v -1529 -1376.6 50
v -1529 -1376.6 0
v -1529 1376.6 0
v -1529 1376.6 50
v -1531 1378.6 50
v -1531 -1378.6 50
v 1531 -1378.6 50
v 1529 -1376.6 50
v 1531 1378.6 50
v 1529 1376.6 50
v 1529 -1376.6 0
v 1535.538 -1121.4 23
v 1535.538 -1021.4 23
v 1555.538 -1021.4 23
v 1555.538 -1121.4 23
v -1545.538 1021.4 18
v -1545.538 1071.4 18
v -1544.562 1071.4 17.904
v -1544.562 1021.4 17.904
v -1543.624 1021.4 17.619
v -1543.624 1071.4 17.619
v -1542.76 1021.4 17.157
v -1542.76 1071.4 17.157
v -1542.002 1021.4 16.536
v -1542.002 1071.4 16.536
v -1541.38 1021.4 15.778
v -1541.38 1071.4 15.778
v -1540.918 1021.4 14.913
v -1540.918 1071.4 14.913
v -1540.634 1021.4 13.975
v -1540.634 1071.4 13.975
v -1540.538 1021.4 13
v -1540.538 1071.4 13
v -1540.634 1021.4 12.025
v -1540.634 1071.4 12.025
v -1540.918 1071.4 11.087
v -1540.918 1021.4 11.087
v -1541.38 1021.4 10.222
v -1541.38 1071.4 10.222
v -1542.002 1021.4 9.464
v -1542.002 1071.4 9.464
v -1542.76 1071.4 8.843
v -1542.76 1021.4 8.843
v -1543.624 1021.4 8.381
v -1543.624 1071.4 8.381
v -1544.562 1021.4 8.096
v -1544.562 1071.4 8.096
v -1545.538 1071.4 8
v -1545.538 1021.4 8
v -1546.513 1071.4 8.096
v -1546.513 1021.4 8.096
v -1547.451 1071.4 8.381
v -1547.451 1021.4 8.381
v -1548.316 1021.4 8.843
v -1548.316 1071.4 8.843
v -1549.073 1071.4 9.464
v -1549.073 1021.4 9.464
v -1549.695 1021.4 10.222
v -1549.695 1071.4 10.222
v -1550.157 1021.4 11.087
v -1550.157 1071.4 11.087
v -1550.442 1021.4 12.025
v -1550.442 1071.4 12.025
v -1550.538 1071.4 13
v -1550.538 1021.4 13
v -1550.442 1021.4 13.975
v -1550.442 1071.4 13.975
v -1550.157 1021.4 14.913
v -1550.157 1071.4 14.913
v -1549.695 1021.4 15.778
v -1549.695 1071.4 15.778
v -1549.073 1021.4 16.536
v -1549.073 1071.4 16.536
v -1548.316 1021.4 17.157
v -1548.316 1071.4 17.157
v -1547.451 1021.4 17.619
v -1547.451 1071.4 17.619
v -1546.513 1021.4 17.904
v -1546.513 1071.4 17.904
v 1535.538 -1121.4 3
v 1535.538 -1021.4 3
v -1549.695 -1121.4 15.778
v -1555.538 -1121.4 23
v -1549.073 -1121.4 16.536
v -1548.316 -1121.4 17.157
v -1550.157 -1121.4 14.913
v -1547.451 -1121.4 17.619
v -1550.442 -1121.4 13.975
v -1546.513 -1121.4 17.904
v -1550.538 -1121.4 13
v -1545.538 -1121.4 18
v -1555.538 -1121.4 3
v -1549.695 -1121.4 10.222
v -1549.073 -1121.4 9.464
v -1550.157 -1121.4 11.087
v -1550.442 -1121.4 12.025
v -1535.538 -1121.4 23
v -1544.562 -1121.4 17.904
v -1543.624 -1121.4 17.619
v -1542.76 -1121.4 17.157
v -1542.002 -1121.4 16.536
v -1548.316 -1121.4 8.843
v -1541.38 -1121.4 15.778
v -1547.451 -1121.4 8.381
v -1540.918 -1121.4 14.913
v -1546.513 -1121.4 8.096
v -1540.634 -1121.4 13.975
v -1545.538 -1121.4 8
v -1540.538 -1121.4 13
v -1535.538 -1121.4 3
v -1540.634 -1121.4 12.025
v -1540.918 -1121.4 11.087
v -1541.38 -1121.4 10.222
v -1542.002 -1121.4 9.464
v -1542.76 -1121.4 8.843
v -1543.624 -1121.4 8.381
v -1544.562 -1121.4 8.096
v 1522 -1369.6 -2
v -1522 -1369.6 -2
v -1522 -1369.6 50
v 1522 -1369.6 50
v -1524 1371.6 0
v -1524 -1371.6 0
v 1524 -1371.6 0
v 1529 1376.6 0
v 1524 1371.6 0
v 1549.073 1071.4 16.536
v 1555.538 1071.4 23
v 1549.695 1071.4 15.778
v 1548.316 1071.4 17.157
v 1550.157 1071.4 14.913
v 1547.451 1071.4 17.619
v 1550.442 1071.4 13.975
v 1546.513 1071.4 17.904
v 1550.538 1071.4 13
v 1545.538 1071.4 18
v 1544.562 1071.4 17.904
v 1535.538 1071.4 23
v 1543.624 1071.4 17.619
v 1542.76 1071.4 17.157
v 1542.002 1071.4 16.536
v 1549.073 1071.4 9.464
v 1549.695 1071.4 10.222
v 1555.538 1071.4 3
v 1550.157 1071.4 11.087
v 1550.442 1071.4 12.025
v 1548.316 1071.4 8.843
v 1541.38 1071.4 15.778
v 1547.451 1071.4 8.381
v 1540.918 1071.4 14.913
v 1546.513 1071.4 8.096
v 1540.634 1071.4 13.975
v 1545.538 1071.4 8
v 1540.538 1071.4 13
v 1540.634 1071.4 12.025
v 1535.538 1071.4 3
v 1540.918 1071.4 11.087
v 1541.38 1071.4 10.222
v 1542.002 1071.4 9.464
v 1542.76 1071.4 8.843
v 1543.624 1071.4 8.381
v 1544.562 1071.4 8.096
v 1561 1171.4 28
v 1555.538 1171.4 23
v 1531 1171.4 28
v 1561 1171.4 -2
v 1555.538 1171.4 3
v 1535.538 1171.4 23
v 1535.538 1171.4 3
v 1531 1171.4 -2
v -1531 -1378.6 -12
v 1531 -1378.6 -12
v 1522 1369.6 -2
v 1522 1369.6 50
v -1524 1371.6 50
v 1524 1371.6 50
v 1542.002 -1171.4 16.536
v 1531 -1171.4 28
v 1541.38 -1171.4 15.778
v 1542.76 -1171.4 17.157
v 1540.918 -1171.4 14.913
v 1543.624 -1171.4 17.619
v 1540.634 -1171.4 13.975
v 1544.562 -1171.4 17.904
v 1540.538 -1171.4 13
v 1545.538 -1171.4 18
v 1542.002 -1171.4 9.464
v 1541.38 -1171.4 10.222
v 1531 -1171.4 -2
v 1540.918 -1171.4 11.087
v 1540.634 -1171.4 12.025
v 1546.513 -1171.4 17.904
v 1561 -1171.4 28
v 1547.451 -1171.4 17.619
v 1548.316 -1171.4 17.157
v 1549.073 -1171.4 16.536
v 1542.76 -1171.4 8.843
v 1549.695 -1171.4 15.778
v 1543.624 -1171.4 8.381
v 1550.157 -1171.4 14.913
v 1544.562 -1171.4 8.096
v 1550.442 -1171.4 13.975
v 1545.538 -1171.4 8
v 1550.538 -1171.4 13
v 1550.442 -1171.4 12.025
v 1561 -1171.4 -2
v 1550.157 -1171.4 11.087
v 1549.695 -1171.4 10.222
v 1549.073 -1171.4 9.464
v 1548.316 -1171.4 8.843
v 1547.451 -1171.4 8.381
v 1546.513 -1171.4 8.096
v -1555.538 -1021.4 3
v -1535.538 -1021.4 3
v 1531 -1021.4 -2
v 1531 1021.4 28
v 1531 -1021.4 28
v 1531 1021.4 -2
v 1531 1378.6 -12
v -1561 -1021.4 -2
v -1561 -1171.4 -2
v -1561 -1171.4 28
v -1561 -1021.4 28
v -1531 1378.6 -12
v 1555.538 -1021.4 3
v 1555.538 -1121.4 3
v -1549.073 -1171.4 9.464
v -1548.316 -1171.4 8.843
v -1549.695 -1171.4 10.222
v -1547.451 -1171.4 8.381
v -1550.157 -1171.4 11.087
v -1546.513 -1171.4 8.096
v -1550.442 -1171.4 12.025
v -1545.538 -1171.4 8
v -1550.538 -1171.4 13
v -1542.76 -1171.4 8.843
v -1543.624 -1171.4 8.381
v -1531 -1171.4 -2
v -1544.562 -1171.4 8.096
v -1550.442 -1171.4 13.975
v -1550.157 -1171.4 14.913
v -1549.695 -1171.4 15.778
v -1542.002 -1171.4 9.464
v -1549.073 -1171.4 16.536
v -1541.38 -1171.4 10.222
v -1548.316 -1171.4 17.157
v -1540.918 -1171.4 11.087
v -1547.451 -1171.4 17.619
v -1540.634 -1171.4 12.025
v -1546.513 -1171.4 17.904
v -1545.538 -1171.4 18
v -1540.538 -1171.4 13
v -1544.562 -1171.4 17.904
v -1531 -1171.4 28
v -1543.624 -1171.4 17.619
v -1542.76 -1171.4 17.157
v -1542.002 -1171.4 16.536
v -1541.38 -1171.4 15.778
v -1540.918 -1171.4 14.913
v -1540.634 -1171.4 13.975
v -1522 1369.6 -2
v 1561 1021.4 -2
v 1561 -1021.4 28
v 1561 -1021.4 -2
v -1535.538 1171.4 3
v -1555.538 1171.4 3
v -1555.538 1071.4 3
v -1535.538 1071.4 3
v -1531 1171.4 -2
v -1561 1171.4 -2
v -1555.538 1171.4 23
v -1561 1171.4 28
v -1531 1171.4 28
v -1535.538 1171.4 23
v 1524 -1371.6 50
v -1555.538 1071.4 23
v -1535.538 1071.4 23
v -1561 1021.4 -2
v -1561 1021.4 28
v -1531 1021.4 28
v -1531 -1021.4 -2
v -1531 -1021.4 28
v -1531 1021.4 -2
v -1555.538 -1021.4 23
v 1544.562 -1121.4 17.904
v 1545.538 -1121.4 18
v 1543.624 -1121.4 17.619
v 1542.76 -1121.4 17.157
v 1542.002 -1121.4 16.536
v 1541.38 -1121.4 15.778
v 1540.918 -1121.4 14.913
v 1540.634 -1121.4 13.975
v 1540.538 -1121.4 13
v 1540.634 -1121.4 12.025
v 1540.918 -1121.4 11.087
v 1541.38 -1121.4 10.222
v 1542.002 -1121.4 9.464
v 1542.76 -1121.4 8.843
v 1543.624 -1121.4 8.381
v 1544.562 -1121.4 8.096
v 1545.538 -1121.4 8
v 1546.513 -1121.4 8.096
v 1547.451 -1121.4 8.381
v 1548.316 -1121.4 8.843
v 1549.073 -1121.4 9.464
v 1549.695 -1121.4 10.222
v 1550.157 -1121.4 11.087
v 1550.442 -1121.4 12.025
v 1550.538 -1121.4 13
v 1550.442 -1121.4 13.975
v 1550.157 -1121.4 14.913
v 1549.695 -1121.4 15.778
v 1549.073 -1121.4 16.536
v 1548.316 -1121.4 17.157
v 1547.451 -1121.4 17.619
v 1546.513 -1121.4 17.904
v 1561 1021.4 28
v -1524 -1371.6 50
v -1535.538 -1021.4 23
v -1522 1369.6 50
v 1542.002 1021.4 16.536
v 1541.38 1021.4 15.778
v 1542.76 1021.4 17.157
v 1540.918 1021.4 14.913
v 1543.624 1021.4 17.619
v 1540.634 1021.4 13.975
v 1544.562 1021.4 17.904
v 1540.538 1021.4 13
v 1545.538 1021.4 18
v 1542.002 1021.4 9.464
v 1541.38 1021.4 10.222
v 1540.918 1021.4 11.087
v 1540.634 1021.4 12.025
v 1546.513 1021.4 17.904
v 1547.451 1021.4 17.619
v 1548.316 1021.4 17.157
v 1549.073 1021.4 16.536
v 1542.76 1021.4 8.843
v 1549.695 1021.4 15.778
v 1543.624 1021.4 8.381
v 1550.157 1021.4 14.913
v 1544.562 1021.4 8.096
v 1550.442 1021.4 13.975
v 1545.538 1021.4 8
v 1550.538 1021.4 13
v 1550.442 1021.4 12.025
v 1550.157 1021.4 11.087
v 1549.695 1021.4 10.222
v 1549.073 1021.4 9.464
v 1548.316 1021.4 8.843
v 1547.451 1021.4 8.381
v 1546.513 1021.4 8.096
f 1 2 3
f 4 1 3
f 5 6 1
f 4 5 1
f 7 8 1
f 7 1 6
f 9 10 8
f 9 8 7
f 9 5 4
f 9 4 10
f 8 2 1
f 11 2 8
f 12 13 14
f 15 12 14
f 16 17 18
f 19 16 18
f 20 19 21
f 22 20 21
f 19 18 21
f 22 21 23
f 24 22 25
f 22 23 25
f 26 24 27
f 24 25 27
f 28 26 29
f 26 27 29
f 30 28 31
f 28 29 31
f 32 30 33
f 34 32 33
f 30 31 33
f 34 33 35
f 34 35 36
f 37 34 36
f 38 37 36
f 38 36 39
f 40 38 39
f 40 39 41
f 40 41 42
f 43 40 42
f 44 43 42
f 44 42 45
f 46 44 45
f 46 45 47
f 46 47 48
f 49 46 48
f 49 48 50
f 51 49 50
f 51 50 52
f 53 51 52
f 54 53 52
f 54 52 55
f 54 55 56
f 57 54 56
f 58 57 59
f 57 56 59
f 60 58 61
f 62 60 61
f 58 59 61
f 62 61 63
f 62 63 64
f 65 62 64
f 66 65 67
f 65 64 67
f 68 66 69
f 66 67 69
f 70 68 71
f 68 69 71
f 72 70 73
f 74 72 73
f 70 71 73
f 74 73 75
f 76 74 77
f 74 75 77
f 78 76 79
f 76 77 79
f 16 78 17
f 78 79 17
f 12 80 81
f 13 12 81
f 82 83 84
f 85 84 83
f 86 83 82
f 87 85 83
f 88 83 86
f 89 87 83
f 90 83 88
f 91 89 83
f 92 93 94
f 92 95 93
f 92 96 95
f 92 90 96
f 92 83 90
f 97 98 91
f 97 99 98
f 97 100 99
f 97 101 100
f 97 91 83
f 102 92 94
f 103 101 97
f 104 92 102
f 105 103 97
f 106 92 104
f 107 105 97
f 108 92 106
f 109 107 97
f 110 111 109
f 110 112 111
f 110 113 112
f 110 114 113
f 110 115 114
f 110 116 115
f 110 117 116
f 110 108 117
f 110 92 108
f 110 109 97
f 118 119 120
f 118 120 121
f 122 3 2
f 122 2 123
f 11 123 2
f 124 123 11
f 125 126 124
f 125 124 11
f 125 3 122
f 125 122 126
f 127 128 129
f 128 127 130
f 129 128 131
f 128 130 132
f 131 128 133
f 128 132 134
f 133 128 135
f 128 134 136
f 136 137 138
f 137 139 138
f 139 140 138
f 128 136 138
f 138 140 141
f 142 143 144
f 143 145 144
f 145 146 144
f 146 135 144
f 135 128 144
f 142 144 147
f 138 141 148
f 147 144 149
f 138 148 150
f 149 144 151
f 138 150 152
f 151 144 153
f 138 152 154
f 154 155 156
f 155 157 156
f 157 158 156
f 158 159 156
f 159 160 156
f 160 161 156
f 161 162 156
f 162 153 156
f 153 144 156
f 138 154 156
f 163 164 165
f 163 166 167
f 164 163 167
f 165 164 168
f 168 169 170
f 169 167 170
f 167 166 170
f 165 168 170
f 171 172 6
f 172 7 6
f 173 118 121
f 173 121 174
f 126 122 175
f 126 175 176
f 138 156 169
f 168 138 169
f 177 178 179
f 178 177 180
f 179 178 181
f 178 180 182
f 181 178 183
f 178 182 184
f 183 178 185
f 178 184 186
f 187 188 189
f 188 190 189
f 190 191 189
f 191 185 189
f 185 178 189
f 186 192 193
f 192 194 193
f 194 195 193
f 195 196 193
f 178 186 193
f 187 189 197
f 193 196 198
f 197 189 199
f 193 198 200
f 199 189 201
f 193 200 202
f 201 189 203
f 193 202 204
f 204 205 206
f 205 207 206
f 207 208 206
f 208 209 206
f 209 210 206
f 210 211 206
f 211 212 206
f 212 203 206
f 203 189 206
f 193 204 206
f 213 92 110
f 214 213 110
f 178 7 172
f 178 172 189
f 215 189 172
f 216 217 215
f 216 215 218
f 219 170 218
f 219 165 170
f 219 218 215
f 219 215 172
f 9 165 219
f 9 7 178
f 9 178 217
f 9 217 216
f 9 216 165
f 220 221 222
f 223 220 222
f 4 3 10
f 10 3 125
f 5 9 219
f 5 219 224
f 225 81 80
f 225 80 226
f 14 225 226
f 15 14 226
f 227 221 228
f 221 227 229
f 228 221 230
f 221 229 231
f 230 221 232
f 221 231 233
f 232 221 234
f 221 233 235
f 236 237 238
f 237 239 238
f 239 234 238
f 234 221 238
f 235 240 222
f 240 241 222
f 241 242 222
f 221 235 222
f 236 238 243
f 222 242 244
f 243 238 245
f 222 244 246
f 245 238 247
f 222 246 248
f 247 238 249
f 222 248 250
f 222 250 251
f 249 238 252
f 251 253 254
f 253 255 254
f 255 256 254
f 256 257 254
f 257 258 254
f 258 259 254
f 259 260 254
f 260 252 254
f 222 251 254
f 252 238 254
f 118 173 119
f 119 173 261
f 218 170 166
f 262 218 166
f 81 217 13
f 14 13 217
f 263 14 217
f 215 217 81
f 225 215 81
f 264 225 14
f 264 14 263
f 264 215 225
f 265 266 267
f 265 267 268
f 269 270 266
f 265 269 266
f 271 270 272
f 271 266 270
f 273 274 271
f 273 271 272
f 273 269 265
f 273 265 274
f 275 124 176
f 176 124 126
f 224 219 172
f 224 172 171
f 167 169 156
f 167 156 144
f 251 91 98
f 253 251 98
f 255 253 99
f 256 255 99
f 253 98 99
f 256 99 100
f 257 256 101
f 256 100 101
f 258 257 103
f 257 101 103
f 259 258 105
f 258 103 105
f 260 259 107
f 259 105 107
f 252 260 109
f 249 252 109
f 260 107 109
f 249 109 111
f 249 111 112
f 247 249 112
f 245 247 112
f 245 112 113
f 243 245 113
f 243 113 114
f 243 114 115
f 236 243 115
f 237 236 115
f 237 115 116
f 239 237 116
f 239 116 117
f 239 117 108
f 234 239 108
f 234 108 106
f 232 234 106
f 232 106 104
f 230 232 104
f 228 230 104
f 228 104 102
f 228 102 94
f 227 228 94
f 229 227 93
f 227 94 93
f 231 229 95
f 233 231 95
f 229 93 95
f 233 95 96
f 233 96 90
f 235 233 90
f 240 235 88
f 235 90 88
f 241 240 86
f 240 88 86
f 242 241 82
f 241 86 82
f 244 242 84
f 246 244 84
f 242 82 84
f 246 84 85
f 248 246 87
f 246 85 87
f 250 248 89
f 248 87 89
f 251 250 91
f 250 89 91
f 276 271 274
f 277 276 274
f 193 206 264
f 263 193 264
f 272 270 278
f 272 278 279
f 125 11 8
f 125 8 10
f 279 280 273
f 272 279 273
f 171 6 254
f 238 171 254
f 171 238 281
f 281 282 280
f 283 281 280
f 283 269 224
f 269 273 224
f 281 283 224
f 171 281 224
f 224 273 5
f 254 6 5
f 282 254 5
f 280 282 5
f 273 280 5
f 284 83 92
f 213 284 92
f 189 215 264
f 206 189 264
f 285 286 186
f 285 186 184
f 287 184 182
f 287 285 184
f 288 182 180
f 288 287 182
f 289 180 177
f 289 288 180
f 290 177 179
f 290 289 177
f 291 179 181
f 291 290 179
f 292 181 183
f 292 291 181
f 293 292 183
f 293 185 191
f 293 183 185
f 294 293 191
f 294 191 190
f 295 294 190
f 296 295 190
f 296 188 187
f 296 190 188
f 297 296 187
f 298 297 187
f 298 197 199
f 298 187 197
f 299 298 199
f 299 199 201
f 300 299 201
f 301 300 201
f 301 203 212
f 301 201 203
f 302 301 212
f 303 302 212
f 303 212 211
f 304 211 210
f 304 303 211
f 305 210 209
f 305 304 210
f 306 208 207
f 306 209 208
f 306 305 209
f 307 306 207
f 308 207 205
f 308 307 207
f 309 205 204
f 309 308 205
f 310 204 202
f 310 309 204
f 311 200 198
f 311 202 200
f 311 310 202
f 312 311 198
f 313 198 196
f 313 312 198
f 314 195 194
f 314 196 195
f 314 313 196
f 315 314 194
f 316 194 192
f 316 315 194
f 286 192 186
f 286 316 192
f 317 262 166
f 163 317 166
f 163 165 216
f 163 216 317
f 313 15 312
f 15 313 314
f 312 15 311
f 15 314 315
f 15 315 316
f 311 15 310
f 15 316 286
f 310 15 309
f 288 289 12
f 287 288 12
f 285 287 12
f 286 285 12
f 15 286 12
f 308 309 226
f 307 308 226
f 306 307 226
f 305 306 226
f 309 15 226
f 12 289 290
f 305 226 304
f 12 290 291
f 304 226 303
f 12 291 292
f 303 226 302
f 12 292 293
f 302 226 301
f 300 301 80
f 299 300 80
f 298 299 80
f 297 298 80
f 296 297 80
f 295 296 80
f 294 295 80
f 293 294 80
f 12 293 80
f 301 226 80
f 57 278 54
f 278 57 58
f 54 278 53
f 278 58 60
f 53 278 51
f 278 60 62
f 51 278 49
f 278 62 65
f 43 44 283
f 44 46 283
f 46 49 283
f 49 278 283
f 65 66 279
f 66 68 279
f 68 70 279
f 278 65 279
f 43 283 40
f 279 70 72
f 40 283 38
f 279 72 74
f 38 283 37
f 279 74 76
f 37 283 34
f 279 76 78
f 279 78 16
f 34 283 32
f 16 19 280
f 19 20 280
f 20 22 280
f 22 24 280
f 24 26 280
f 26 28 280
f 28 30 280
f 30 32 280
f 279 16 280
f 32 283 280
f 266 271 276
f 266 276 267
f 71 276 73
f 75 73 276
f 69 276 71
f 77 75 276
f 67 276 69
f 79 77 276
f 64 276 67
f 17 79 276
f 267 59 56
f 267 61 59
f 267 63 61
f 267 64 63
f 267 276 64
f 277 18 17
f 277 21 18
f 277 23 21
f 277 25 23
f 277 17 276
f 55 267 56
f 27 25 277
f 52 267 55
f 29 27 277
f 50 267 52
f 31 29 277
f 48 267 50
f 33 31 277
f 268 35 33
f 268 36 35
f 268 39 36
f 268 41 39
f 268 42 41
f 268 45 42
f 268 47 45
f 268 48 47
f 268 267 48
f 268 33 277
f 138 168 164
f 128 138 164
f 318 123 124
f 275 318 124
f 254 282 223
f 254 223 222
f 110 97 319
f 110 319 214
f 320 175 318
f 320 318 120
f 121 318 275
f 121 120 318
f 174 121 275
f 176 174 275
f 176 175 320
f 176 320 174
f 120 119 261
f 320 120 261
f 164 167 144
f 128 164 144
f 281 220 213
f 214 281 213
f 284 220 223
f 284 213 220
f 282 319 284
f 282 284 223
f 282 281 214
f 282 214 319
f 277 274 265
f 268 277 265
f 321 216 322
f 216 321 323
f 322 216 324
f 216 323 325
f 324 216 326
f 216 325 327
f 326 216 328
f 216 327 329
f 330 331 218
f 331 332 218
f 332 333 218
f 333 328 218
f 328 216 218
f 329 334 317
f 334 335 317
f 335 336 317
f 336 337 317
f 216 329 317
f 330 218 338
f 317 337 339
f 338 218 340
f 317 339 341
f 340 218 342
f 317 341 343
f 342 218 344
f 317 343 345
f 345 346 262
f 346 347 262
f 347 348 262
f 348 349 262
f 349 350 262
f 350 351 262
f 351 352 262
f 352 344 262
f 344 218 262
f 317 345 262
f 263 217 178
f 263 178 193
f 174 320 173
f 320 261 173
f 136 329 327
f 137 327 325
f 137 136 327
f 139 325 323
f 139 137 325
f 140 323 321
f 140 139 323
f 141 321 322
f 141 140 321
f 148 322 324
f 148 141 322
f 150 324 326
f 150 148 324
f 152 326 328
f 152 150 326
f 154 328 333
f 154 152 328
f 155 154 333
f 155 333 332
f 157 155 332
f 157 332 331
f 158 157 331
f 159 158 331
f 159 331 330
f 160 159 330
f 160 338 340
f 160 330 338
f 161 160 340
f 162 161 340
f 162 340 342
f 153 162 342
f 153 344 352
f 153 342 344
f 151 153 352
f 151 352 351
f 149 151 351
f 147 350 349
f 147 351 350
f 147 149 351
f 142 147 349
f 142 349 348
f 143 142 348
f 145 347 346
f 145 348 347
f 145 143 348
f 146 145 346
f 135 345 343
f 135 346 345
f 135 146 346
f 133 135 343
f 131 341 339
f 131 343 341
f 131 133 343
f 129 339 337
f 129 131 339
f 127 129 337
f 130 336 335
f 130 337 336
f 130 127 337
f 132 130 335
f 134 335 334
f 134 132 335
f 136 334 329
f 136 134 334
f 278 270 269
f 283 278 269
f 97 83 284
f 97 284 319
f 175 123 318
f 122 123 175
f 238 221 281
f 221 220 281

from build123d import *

# Parameters (mm, degrees)
SKETCH1_W           = 3058
SKETCH1_H           = 2753.2
SKETCH1_W_2         = 3048
SKETCH1_H_2         = 2743.2
BOSS_EXTRUDE1_DEPTH = 50
SHELL4_T            = 2
SKETCH2_W           = 30
SKETCH2_H           = 150
BOSS_EXTRUDE2_DEPTH = 30
SKETCH4_W           = 20
SKETCH4_H           = 20
CUT_EXTRUDE1_DEPTH  = 100
SKETCH5_W           = 20
SKETCH5_H           = 20
CUT_EXTRUDE2_DEPTH  = 100
MIRROR2_START       = -2
MIRROR2_DEPTH       = 30
MIRROR2_2_OUTLINE_W = 20
MIRROR2_2_OUTLINE_H = 100
MIRROR2_2_DEPTH     = 5
MIRROR2_START_2     = 23
MIRROR2_3_OUTLINE_W = 20
MIRROR2_3_OUTLINE_H = 100
MIRROR2_3_DEPTH     = 5
SKETCH7_W           = 3062
SKETCH7_H           = 2757.2
BOSS_EXTRUDE3_DEPTH = 10
SKETCH8_R           = 5
CUT_EXTRUDE3_DEPTH  = 2600


# Read off the part's stored shape, not the designer's step: Mirror2
with BuildPart() as part:
    # Sketch1 → Boss-Extrude1 (new body)
    with BuildSketch(Plane.XY):
        Rectangle(SKETCH1_W, SKETCH1_H)
        Rectangle(SKETCH1_W_2, SKETCH1_H_2, mode=Mode.SUBTRACT)
    extrude(amount=BOSS_EXTRUDE1_DEPTH)

    # Shell4
    shell4_openings = [part.faces().sort_by_distance(p)[0] for p in [
        (-1524.885212735, 0, 50),
    ]]
    offset(amount=SHELL4_T, openings=shell4_openings, kind=Kind.INTERSECTION)

    # Sketch2 → Boss-Extrude2 (add)
    with BuildSketch(Plane.ZY.offset(1531)):
        with Locations((13, 1096.4)):
            Rectangle(SKETCH2_W, SKETCH2_H)
    boss_extrude2 = extrude(amount=BOSS_EXTRUDE2_DEPTH)

    # Mirror1: Boss-Extrude2 across plane
    add(boss_extrude2.mirror(Plane.ZX))

    # Sketch4 → Cut-Extrude1 (cut)
    with BuildSketch(Plane(origin=(0, 1171.4, 0), x_dir=(1, 0, 0), z_dir=(0, 1, 0))):
        with Locations((-1545.537717339, -13)):
            Rectangle(SKETCH4_W, SKETCH4_H)
    extrude(amount=-CUT_EXTRUDE1_DEPTH, mode=Mode.SUBTRACT)

    # Sketch5 → Cut-Extrude2 (cut)
    with BuildSketch(Plane(origin=(0, -1021.4, 0), x_dir=(1, 0, 0), z_dir=(0, 1, 0))):
        with Locations((-1545.537717339, -13)):
            Rectangle(SKETCH5_W, SKETCH5_H)
    extrude(amount=-CUT_EXTRUDE2_DEPTH, mode=Mode.SUBTRACT)

    # Mirror2 outline → Mirror2 (add)
    with BuildSketch(Plane.XY.offset(MIRROR2_START)):
        Polygon((1531, 1171.4), (1531, 1021.4), (1561, 1021.4), (1561, 1171.4), (1555.537717339, 1171.4), (1555.537717339, 1071.4), (1535.537717339, 1071.4), (1535.537717339, 1171.4), align=None)
        Polygon((1535.537717339, -1021.4), (1531, -1021.4), (1531, -1171.4), (1561, -1171.4), (1561, -1021.4), (1555.537717339, -1021.4), (1555.537717339, -1121.4), (1535.537717339, -1121.4), align=None)
    extrude(amount=MIRROR2_DEPTH)

    # Mirror2 2 outline → Mirror2 2 (add)
    with BuildSketch(Plane.XY.offset(MIRROR2_START)):
        with Locations((1545.537717339, -1071.4)):
            Rectangle(MIRROR2_2_OUTLINE_W, MIRROR2_2_OUTLINE_H)
        with Locations((1545.537717339, 1121.4)):
            Rectangle(MIRROR2_2_OUTLINE_W, MIRROR2_2_OUTLINE_H)
    extrude(amount=MIRROR2_2_DEPTH)

    # Mirror2 3 outline → Mirror2 3 (add)
    with BuildSketch(Plane.XY.offset(MIRROR2_START_2)):
        with Locations((1545.537717339, -1071.4)):
            Rectangle(MIRROR2_3_OUTLINE_W, MIRROR2_3_OUTLINE_H)
        with Locations((1545.537717339, 1121.4)):
            Rectangle(MIRROR2_3_OUTLINE_W, MIRROR2_3_OUTLINE_H)
    extrude(amount=MIRROR2_3_DEPTH)

    # Sketch7 → Boss-Extrude3 (add)
    with BuildSketch(Plane(origin=(0, 0, -2), x_dir=(-1, 0, 0), z_dir=(0, 0, -1))):
        Rectangle(SKETCH7_W, SKETCH7_H)
    extrude(amount=BOSS_EXTRUDE3_DEPTH)

    # Sketch8 → Cut-Extrude3 (cut)
    with BuildSketch(Plane(origin=(0, 1071.4, 0), x_dir=(1, 0, 0), z_dir=(0, 1, 0))):
        with Locations(Location((-1545.537717339, -13, 0), (0, 0, 270))):
            Circle(SKETCH8_R)
    cut_extrude3 = extrude(amount=-CUT_EXTRUDE3_DEPTH, mode=Mode.SUBTRACT)

    # Mirror3: Cut-Extrude3 across plane
    add(cut_extrude3.mirror(Plane(origin=(0, 0, 0), x_dir=(0, 0, 1), z_dir=(1, 0, 0))), mode=Mode.SUBTRACT)


solid = part.part
